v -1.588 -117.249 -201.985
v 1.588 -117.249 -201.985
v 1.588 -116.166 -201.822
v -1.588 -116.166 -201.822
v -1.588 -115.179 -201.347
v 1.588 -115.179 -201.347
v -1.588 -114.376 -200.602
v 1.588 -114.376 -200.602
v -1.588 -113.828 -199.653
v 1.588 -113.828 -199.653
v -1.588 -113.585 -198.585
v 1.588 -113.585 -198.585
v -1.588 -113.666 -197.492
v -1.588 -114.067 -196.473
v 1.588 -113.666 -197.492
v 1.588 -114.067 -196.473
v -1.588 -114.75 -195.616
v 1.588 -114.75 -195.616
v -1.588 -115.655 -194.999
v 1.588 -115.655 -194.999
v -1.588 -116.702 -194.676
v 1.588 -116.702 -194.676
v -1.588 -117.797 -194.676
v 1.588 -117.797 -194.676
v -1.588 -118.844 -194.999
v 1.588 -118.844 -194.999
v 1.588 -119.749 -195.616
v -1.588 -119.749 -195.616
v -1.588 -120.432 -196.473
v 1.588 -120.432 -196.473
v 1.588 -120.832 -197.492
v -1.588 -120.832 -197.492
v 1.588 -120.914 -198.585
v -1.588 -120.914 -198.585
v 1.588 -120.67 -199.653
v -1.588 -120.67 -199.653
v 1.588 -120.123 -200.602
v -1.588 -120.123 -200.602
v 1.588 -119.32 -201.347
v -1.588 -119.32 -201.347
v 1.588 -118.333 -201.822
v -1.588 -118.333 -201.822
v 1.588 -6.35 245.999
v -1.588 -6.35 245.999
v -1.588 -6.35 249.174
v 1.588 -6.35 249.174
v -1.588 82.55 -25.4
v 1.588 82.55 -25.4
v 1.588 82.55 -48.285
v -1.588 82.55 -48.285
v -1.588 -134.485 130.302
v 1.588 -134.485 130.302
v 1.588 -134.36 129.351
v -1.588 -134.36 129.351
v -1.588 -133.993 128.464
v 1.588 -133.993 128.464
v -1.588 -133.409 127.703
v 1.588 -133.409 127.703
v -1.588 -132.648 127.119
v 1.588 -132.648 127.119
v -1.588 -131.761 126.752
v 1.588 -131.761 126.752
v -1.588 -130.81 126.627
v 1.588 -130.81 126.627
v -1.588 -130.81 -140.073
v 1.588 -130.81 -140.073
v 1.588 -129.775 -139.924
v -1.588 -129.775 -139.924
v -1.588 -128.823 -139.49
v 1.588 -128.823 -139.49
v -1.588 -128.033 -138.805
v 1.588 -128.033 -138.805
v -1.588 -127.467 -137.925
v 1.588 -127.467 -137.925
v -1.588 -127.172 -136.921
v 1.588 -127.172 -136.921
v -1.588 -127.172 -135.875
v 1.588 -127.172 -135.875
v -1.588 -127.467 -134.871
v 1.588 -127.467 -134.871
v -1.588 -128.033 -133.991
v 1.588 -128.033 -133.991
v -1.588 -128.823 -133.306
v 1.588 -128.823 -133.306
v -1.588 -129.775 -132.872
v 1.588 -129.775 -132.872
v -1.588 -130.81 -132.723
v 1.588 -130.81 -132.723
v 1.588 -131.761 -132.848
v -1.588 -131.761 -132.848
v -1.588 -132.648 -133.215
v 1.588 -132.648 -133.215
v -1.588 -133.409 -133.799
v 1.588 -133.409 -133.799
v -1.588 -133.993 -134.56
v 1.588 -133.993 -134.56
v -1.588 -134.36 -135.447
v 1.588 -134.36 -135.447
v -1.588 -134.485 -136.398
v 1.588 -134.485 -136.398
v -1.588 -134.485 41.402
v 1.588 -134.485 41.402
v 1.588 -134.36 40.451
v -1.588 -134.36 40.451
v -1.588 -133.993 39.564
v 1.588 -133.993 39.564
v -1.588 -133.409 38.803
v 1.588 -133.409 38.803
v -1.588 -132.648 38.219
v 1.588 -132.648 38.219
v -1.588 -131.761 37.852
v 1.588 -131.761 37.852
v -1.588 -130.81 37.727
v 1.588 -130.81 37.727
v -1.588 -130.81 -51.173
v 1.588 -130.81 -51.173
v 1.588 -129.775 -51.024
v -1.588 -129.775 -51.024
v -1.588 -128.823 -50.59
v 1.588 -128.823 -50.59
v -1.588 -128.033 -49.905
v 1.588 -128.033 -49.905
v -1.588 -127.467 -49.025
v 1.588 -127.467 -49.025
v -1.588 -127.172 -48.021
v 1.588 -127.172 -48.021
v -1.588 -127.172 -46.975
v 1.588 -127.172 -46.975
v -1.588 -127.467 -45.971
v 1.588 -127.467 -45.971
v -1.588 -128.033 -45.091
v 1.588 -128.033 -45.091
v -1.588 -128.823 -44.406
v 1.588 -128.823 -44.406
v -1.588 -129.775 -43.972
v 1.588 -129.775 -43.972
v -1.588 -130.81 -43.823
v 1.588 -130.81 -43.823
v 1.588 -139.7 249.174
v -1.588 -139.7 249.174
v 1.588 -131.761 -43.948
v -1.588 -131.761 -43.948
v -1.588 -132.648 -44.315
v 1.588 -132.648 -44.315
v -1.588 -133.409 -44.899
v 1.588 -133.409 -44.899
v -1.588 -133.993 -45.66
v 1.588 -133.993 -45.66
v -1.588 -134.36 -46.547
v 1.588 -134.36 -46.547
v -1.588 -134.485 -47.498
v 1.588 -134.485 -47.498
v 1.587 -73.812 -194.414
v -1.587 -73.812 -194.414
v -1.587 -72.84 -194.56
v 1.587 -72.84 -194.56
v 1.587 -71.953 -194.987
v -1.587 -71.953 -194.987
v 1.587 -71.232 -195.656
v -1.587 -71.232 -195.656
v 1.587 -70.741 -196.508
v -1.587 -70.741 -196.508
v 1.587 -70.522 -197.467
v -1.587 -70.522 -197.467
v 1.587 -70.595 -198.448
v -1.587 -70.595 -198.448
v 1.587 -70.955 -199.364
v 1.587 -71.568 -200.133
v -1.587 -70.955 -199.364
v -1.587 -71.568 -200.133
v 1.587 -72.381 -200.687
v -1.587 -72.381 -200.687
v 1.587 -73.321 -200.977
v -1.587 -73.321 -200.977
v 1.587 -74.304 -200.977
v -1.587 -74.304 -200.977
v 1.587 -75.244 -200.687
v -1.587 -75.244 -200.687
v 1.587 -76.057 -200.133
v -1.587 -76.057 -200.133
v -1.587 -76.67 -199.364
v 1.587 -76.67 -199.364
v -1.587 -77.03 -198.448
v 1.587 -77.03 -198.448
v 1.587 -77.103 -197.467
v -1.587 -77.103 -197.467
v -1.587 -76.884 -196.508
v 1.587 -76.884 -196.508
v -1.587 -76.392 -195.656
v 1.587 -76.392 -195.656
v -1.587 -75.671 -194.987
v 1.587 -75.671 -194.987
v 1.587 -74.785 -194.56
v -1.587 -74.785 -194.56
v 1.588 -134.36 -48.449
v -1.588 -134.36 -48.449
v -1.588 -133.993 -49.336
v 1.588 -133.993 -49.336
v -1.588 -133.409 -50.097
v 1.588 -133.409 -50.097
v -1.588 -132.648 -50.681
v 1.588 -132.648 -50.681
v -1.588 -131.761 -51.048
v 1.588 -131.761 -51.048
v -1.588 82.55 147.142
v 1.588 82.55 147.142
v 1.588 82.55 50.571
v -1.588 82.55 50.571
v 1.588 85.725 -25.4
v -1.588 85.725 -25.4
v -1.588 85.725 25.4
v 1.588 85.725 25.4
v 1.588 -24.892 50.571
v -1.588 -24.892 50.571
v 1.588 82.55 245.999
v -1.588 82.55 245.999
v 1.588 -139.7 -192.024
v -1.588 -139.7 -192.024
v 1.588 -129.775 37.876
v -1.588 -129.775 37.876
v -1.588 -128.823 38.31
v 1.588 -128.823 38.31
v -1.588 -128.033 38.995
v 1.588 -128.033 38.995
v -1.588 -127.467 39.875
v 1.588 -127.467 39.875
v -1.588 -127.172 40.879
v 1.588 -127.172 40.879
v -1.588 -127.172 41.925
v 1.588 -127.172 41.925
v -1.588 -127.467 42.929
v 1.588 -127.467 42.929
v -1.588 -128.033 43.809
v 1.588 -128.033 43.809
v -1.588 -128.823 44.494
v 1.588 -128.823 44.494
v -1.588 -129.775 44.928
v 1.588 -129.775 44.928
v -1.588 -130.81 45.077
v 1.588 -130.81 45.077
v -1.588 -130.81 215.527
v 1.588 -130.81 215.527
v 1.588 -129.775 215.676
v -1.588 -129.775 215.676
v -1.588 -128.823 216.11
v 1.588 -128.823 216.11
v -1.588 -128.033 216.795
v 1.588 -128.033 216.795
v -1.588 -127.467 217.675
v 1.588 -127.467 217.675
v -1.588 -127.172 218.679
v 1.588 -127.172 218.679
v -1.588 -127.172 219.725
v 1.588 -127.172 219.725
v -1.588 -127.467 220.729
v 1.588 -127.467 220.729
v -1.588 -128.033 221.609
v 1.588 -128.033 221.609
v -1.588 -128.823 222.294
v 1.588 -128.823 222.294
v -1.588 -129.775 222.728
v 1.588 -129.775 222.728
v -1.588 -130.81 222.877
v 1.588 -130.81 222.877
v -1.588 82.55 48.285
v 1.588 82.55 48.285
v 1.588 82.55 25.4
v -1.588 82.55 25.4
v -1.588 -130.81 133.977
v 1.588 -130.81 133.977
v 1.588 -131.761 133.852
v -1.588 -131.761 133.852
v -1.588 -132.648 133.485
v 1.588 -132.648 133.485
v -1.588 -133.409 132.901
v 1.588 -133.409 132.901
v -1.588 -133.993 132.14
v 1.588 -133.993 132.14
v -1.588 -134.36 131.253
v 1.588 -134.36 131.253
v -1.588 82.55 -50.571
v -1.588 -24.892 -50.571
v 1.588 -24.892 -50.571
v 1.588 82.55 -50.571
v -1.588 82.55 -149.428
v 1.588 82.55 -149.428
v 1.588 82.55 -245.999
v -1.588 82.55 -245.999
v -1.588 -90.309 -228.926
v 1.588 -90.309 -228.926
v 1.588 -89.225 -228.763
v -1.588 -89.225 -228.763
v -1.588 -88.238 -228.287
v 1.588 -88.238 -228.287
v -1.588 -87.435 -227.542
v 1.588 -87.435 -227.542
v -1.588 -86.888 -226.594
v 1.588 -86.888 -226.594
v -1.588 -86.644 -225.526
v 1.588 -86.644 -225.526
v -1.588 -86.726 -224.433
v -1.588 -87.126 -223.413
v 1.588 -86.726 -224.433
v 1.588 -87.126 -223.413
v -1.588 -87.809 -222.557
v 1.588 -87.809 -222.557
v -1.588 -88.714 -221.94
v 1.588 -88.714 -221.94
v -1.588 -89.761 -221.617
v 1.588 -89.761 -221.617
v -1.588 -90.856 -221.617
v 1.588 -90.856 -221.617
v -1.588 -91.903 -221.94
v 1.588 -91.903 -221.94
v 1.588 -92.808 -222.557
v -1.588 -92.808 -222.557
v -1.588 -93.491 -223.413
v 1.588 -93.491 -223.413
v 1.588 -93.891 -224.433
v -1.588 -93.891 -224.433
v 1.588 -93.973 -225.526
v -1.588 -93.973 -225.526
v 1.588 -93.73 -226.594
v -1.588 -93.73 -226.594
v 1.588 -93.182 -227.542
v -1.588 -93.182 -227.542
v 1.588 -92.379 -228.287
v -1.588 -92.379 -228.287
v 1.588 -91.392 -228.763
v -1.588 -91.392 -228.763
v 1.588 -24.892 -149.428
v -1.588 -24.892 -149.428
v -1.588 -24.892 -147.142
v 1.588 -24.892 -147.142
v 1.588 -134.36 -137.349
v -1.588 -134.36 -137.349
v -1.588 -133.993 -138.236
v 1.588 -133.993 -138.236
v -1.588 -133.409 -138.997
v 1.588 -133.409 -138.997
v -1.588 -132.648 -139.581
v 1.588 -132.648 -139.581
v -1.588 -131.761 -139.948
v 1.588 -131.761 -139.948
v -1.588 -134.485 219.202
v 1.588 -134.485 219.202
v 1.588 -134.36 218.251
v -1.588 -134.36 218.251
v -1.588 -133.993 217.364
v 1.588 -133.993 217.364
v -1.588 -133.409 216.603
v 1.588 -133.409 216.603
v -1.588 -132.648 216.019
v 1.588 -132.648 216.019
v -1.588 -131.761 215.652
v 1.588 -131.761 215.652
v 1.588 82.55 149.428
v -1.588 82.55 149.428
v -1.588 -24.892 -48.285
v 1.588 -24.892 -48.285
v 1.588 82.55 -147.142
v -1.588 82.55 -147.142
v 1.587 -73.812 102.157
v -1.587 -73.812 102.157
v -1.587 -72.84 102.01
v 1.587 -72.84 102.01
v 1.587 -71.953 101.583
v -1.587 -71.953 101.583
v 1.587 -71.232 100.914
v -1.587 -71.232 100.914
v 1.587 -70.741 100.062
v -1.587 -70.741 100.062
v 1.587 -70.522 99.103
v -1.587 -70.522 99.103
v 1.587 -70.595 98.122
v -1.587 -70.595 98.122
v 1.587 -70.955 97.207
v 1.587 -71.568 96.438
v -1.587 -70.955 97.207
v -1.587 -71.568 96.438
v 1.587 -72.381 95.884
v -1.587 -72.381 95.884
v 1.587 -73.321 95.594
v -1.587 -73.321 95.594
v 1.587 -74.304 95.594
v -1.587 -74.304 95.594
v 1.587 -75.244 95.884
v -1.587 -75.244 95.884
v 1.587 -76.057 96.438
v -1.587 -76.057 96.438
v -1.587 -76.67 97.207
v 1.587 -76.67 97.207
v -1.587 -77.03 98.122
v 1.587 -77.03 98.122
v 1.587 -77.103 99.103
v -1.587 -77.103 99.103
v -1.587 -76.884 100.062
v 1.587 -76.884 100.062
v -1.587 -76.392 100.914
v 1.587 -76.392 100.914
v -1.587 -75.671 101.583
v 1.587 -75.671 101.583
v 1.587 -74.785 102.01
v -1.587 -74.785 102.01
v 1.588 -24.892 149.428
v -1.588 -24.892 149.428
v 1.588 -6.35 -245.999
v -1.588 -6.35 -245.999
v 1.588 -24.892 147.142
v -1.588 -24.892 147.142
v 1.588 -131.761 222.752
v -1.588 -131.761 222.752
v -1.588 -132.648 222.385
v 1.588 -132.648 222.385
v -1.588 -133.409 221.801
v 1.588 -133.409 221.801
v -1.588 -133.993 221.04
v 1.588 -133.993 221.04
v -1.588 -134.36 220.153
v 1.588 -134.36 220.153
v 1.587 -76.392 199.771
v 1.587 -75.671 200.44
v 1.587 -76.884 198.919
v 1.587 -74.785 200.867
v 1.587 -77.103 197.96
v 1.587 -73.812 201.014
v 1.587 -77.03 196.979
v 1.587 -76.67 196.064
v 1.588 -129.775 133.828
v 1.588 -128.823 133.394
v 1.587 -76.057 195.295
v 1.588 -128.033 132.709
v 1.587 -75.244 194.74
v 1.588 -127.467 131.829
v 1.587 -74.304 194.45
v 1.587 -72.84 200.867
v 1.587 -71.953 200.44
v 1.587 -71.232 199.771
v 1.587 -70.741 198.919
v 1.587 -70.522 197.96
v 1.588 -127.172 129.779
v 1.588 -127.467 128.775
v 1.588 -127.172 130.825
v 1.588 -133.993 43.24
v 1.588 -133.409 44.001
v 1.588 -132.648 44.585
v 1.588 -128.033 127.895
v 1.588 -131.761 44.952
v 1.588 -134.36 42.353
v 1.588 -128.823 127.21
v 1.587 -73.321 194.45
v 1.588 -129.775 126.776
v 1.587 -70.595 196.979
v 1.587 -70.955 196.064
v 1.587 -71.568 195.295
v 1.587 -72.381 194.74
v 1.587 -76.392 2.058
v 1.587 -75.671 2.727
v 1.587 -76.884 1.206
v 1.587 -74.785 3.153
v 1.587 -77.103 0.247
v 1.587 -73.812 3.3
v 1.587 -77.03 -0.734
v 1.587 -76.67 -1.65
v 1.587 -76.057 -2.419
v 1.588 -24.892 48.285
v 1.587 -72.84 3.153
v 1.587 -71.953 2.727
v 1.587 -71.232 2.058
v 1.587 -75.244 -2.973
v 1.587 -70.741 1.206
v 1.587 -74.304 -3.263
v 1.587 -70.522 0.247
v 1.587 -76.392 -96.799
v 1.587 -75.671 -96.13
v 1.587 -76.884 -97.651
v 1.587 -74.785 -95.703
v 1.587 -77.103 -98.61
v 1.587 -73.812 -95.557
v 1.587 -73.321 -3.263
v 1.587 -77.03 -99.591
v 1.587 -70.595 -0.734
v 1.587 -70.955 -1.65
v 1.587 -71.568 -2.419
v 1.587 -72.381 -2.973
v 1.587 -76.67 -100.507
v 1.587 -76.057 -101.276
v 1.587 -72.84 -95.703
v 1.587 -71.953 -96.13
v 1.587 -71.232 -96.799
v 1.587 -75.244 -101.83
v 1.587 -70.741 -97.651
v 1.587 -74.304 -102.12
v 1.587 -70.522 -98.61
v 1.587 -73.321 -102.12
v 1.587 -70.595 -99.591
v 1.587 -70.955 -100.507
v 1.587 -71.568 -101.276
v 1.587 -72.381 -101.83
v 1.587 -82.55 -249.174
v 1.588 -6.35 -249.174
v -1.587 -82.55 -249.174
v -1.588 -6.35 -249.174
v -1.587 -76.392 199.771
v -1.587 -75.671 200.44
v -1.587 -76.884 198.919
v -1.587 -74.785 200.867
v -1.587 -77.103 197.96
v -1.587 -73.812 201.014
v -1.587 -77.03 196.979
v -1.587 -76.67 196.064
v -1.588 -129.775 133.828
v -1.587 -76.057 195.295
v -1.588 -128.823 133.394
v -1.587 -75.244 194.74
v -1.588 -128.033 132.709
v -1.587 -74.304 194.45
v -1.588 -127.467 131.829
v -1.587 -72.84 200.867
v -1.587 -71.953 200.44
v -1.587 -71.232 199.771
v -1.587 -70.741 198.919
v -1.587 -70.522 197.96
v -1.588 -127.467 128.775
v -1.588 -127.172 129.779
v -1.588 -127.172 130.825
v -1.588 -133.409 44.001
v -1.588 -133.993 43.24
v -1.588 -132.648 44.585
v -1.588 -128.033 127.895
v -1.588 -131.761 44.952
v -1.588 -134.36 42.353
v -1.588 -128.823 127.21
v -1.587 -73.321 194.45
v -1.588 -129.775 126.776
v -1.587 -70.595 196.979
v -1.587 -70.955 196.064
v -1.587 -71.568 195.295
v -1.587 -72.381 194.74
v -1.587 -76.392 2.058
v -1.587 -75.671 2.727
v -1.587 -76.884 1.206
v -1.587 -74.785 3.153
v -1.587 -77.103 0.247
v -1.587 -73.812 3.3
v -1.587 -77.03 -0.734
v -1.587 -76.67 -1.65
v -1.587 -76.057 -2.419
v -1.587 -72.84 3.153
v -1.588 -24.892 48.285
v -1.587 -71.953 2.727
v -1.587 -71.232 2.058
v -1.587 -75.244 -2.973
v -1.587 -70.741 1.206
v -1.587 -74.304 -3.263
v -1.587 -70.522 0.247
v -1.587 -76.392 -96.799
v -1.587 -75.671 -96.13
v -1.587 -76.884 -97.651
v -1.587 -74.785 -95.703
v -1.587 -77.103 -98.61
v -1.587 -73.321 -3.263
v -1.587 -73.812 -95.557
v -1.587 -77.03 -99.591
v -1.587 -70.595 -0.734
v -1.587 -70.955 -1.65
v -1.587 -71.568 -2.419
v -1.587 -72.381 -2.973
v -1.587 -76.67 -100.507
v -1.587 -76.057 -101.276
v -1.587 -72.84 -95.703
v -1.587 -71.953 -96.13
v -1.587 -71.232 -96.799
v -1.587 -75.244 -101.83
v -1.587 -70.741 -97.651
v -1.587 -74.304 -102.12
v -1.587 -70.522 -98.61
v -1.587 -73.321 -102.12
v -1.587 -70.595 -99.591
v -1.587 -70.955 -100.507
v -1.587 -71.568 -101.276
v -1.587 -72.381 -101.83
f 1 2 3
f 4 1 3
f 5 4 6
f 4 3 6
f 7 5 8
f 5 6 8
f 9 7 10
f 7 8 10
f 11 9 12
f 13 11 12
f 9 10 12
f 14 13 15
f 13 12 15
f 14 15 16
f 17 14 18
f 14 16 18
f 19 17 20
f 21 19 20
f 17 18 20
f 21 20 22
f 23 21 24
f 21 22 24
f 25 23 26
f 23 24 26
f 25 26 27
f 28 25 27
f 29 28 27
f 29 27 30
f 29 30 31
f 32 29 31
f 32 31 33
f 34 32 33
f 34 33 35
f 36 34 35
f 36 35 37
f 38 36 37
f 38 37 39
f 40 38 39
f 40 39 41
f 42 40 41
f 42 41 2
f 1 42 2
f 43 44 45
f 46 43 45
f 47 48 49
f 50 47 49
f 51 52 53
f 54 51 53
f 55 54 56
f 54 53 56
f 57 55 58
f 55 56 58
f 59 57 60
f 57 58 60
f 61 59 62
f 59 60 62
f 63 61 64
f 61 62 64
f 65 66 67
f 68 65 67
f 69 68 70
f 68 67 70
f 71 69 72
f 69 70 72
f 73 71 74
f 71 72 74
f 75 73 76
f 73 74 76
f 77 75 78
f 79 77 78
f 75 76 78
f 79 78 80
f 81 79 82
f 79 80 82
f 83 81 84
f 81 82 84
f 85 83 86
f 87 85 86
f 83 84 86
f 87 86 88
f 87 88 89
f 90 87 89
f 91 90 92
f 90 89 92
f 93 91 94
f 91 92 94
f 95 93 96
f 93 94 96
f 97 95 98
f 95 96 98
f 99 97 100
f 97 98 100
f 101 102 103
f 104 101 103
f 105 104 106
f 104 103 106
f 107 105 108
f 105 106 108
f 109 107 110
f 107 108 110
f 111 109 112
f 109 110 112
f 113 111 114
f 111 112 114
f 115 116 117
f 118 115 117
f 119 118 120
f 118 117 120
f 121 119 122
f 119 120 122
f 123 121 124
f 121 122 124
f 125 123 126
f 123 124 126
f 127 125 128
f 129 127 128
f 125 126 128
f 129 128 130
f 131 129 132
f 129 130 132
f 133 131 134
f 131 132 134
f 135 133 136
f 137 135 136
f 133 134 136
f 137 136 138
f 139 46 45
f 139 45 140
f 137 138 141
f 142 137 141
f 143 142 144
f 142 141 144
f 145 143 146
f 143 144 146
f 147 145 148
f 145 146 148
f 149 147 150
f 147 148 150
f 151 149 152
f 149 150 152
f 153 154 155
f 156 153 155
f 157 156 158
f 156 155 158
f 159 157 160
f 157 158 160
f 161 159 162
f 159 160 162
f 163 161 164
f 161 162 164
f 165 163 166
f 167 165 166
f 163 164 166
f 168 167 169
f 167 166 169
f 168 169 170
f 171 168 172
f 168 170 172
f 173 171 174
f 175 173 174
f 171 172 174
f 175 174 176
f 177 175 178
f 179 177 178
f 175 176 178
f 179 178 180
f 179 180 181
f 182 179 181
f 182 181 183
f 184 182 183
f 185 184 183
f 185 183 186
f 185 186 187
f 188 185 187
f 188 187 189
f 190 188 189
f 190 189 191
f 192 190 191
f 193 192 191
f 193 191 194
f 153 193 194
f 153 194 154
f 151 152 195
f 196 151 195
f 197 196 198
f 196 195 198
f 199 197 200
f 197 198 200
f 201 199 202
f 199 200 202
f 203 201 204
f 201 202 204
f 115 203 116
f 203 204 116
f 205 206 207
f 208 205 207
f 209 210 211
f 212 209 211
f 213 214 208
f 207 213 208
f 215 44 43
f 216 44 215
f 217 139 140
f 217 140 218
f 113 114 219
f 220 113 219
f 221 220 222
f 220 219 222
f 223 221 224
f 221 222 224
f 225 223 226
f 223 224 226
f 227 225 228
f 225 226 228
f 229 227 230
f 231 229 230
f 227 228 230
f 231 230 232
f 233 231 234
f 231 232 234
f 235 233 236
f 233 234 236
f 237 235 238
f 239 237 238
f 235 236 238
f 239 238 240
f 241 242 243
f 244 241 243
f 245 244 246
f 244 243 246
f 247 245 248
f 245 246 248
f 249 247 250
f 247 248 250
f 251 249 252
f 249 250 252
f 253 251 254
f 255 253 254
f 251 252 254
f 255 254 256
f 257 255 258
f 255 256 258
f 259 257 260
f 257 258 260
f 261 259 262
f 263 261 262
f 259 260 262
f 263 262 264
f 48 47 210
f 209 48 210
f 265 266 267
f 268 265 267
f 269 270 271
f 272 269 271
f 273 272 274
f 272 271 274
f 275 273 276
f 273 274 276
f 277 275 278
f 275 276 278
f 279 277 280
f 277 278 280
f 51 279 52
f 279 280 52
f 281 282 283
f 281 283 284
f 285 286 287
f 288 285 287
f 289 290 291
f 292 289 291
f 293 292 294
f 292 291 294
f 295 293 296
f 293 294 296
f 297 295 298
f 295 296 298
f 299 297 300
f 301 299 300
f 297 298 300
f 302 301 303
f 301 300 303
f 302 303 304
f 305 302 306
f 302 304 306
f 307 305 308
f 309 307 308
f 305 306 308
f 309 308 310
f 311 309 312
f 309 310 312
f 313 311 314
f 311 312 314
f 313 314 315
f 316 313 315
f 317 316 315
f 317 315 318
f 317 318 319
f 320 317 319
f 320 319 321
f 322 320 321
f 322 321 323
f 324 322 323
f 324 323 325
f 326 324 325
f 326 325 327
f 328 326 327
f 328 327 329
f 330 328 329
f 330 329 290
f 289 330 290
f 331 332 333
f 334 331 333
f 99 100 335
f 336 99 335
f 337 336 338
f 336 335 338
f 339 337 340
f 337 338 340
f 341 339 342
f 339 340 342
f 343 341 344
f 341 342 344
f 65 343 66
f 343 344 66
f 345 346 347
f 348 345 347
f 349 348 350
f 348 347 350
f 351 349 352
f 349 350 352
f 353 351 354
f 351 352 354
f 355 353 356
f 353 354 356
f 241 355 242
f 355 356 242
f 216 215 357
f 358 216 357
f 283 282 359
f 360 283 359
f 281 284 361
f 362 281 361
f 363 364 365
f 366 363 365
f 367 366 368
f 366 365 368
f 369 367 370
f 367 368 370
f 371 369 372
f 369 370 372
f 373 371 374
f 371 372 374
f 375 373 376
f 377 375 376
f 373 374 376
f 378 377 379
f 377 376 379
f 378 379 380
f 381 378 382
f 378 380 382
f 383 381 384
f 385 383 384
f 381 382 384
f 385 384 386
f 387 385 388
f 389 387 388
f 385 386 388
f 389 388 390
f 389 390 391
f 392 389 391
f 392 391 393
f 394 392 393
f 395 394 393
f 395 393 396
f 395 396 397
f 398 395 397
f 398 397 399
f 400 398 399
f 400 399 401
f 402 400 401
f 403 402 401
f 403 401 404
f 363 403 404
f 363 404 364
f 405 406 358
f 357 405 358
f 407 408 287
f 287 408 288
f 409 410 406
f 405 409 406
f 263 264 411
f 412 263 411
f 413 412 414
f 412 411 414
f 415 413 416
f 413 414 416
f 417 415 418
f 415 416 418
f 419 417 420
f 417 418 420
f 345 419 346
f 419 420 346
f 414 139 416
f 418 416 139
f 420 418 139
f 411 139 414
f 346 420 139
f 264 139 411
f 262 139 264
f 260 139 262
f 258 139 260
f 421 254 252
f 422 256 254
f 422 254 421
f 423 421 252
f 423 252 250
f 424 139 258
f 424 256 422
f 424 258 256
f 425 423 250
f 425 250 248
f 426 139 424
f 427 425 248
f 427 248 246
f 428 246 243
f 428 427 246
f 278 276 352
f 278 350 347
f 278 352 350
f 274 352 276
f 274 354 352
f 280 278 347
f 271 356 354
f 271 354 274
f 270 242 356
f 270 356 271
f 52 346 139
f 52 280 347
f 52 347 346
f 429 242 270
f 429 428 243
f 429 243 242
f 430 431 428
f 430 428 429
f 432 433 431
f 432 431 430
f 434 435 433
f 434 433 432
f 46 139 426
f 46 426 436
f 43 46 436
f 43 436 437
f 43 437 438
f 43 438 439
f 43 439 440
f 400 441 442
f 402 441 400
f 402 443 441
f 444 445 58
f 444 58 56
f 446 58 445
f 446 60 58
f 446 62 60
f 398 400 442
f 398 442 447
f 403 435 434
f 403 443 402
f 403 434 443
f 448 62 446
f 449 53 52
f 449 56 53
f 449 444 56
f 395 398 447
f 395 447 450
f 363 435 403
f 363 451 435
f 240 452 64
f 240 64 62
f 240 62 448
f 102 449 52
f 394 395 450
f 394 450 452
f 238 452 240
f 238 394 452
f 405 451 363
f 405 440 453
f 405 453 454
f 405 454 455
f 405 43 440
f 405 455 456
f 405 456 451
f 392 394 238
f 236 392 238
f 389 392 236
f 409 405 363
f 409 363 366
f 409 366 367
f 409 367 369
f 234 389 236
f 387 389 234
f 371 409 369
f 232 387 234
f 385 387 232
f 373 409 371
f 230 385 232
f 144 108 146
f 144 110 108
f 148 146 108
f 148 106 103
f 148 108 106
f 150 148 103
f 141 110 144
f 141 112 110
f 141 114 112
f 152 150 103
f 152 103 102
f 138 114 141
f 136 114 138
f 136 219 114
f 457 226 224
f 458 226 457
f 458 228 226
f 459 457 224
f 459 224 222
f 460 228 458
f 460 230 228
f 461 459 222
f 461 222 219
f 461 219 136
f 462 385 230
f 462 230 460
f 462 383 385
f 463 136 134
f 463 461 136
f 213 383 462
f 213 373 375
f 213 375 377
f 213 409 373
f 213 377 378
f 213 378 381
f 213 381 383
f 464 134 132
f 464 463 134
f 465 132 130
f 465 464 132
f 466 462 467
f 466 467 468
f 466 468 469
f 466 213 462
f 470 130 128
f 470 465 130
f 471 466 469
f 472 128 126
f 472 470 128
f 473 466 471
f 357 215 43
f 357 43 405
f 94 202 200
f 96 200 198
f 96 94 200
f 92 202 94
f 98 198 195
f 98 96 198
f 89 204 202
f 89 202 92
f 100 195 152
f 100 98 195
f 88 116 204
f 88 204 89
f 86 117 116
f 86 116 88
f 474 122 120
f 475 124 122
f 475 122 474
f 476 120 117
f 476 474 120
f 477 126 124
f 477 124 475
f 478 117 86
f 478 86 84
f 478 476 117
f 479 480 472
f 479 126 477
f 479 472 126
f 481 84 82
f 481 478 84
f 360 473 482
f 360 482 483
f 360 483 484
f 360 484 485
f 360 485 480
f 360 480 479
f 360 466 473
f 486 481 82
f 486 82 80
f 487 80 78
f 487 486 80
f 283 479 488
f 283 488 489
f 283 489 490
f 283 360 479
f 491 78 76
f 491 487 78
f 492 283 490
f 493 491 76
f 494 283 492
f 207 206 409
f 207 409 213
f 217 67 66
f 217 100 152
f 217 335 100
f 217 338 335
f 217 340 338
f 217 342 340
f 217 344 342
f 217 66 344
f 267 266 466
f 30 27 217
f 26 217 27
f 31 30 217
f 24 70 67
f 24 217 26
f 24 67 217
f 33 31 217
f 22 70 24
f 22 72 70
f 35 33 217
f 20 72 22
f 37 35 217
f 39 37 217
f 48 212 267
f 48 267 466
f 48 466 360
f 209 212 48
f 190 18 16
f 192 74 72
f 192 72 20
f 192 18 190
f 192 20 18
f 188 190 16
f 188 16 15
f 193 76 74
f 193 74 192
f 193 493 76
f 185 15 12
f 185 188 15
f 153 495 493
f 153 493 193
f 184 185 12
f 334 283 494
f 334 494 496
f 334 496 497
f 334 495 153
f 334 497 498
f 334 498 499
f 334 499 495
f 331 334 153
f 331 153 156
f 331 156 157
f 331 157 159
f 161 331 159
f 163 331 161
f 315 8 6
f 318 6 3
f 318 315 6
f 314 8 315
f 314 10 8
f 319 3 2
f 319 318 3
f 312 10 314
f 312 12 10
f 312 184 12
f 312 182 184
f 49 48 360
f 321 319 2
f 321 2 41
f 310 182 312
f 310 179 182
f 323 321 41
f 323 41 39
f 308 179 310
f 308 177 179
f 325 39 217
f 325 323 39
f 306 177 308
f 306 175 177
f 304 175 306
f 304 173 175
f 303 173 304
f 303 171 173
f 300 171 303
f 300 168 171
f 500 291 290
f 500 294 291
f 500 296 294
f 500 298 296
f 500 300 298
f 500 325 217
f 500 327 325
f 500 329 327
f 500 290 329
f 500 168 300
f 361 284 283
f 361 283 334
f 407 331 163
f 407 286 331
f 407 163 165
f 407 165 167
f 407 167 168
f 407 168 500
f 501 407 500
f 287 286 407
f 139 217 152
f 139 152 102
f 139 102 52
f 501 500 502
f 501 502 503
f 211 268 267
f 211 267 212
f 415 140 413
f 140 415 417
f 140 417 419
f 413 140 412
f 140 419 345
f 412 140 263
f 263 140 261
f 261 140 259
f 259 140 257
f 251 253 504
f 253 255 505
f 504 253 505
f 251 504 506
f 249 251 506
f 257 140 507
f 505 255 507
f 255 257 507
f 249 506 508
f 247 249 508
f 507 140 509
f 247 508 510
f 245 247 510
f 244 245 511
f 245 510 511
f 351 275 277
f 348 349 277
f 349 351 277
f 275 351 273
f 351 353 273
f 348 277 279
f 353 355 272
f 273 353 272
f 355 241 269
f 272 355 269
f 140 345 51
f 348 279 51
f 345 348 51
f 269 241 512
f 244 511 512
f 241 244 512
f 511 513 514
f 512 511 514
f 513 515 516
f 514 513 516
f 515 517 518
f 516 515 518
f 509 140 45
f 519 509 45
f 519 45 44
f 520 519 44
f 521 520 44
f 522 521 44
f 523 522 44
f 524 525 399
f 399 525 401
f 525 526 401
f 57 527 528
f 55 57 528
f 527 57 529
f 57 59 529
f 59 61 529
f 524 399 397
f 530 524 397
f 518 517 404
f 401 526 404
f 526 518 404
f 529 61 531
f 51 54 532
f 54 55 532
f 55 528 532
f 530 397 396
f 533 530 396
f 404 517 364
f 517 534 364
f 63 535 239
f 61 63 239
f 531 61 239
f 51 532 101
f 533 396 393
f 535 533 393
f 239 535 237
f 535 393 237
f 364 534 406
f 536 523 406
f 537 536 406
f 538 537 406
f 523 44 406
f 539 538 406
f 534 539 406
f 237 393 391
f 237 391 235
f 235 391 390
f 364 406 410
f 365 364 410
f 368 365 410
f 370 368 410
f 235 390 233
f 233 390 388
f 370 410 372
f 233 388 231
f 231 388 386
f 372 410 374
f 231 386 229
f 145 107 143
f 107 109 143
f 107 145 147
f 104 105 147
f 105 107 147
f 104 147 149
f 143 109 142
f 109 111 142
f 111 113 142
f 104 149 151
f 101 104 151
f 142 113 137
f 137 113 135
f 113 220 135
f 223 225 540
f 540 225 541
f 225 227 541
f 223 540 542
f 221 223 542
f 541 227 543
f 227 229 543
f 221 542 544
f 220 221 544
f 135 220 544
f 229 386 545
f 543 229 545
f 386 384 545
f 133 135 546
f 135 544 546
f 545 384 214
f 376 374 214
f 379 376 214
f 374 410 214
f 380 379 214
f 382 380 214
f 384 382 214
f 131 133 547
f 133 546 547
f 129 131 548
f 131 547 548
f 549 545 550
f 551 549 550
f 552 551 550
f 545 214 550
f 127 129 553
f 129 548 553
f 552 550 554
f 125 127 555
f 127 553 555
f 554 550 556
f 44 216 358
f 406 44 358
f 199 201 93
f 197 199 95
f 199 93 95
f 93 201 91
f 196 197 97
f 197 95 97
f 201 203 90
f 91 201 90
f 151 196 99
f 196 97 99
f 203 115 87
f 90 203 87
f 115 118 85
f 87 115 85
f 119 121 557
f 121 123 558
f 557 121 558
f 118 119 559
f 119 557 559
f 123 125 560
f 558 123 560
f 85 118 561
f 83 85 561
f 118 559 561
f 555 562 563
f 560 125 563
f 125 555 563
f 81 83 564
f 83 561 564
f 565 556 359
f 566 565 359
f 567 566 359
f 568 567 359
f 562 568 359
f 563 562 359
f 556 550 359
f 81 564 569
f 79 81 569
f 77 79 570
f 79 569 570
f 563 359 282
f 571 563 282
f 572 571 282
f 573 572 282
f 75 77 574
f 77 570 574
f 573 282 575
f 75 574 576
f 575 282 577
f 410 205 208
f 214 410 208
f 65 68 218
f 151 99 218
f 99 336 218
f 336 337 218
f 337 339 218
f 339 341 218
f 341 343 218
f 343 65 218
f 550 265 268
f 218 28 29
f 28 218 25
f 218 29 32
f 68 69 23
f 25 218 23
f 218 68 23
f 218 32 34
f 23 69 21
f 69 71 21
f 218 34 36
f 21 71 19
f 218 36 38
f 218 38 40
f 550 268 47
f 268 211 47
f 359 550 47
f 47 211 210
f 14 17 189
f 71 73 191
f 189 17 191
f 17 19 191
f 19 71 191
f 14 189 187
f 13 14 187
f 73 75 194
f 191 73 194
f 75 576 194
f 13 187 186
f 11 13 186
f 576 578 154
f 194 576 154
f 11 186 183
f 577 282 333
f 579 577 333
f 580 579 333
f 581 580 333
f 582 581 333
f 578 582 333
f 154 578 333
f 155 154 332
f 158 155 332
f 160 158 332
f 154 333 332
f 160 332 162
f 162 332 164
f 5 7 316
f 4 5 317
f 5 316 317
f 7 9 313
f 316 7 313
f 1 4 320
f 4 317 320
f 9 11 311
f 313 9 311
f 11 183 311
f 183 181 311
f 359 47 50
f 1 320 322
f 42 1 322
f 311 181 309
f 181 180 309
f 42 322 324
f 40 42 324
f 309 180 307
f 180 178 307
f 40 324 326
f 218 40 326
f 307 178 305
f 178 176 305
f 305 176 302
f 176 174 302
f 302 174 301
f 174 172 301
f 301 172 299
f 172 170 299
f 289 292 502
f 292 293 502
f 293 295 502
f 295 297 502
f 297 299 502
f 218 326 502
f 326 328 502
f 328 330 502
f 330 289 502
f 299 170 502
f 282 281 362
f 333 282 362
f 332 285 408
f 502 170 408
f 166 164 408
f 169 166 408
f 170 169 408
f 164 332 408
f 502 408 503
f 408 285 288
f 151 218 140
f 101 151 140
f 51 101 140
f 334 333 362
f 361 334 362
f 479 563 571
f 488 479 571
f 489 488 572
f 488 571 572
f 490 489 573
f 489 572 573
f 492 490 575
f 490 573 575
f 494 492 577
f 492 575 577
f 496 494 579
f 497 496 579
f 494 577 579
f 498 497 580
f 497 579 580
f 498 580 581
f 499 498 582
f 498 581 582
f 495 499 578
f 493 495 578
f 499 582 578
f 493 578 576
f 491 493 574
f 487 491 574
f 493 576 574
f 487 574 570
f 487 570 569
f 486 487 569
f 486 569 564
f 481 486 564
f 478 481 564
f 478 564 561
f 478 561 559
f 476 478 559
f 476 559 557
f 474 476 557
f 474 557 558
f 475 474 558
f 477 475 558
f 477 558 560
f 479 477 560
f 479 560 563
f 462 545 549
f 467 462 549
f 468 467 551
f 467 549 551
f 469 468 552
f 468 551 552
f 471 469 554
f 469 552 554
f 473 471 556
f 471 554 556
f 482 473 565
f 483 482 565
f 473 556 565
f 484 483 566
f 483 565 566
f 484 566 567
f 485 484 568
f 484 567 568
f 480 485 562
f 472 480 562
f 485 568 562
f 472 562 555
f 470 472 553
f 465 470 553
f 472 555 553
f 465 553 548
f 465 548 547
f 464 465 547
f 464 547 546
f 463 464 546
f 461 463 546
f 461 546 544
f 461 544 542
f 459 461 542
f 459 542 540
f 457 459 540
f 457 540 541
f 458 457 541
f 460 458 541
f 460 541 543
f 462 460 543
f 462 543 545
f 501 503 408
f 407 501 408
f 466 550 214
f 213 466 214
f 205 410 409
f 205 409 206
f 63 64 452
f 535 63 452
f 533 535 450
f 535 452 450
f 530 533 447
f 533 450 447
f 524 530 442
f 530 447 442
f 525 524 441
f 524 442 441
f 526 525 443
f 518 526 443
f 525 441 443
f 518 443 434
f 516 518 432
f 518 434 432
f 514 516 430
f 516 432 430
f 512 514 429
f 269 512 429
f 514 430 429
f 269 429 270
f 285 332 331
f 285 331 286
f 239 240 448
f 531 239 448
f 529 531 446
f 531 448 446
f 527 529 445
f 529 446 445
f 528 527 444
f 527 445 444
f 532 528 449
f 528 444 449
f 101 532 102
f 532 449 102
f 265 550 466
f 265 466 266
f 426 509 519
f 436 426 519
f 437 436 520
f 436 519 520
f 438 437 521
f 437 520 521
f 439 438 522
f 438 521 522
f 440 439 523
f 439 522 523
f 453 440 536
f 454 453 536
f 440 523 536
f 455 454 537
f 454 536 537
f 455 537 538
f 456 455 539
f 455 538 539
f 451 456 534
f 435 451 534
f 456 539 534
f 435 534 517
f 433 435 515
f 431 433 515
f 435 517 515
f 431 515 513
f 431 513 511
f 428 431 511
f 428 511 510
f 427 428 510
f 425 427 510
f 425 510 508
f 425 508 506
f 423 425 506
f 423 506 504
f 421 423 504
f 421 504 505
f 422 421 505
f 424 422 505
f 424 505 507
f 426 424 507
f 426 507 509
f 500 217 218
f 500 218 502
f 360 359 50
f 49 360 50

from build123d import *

# Parameters (mm, degrees)
SKETCH1_W            = 498.348
SKETCH1_H            = 165.1
BOSS_EXTRUDE1_DEPTH  = 1.5875
BOSS_EXTRUDE2_DEPTH  = 3.175
CUT_EXTRUDE1_DEPTH   = 3.175
LPATTERN1_COUNT      = 5
LPATTERN1_PITCH      = 88.9
SKETCH4_R            = 3.675
CUT_EXTRUDE2_DEPTH   = 4.175
LPATTERN2_COUNT      = 2
LPATTERN2_PITCH      = 38.1
SKETCH5_W            = 3.175
SKETCH5_H            = 88.9
CUT_EXTRUDE3_DEPTH   = 4.175
SKETCH6_W            = 2.286
SKETCH6_H            = 107.442
CUT_EXTRUDE4_DEPTH   = 4.175
LPATTERN3_COUNT      = 4
LPATTERN3_PITCH      = 98.8568
SKETCH7_W            = 50.8
SKETCH7_H            = 3.175
BOSS_EXTRUDE3_DEPTH  = 3.175
M6_CLEARANCE_HOLE1_D = 6.6
LPATTERN4_COUNT      = 3
LPATTERN4_PITCH      = 98.8568
LPATTERN4_COL_COUNT  = 3
LPATTERN4_COL_PITCH  = 98.8568


with BuildPart() as part:
    # Sketch1 → Boss-Extrude1 (new body, symmetric)
    with BuildSketch(Plane(origin=(0, 0, 0), x_dir=(0, 0, -1), z_dir=(1, 0, 0))):
        Rectangle(SKETCH1_W, SKETCH1_H)
    extrude(amount=BOSS_EXTRUDE1_DEPTH, both=True)

    # Sketch2 → Boss-Extrude2 (add)
    with BuildSketch(Plane(origin=(1.5875, 0, 0), x_dir=(0, 0, -1), z_dir=(1, 0, 0))):
        Polygon((-249.174, -139.7), (192.024, -139.7), (249.174, -82.55), (-249.174, -82.55), align=None)
    extrude(amount=-BOSS_EXTRUDE2_DEPTH)

    # Sketch3 → Cut-Extrude1 (cut)
    with BuildSketch(Plane(origin=(1.5875, 0, 0), x_dir=(0, 0, -1), z_dir=(1, 0, 0))):
        with BuildLine():
            ThreePointArc((-222.877, -130.81), (-221.800617421, -133.408617421), (-219.202, -134.485))
            Line((-219.202, -134.485), (-219.202, -130.81))
            Line((-219.202, -130.81), (-222.877, -130.81))
        make_face()
        with BuildLine():
            Line((-219.202, -130.81), (-219.202, -134.485))
            ThreePointArc((-219.202, -134.485), (-216.603382579, -133.408617421), (-215.527, -130.81))
            ThreePointArc((-215.527, -130.81), (-219.202, -127.135), (-222.877, -130.81))
            Line((-222.877, -130.81), (-219.202, -130.81))
        make_face()
    cut_extrude1 = extrude(amount=-CUT_EXTRUDE1_DEPTH, mode=Mode.SUBTRACT)

    # LPattern1: Cut-Extrude1 ×5
    with Locations(*[(0, 0, -i * LPATTERN1_PITCH) for i in range(1, LPATTERN1_COUNT)]):
        add(cut_extrude1, mode=Mode.SUBTRACT)

    # Sketch4 → Cut-Extrude2 (cut, through all)
    with BuildSketch(Plane(origin=(1.5875, 0, 0), x_dir=(0, 0, -1), z_dir=(1, 0, 0))):
        with Locations((198.310179285, -117.249359697)):
            Circle(SKETCH4_R)
    cut_extrude2 = extrude(amount=-CUT_EXTRUDE2_DEPTH, mode=Mode.SUBTRACT)

    # LPattern2: Cut-Extrude2 ×2
    with Locations(*[Vector(0, 0.707106781, -0.707106781) * (i * LPATTERN2_PITCH) for i in range(1, LPATTERN2_COUNT)]):
        add(cut_extrude2, mode=Mode.SUBTRACT)

    # Sketch5 → Cut-Extrude3 (cut, through all)
    with BuildSketch(Plane.ZY.offset(1.5875)):
        with Locations((-247.5865, 38.1)):
            Rectangle(SKETCH5_W, SKETCH5_H)
        with Locations((247.5865, 38.1)):
            Rectangle(SKETCH5_W, SKETCH5_H)
    extrude(amount=-CUT_EXTRUDE3_DEPTH, mode=Mode.SUBTRACT)

    # Sketch6 → Cut-Extrude4 (cut, through all)
    with BuildSketch(Plane.ZY.offset(1.5875)):
        with Locations((-148.2852, 28.829)):
            Rectangle(SKETCH6_W, SKETCH6_H)
    cut_extrude4 = extrude(amount=-CUT_EXTRUDE4_DEPTH, mode=Mode.SUBTRACT)

    # LPattern3: Cut-Extrude4 ×4
    with Locations(*[(0, 0, i * LPATTERN3_PITCH) for i in range(1, LPATTERN3_COUNT)]):
        add(cut_extrude4, mode=Mode.SUBTRACT)

    # Sketch7 → Boss-Extrude3 (add)
    with BuildSketch(Plane.ZY.offset(1.5875)):
        with Locations((0, 84.1375)):
            Rectangle(SKETCH7_W, SKETCH7_H)
    extrude(amount=-BOSS_EXTRUDE3_DEPTH)

    # M6 Clearance Hole1 (through all)
    with Locations(Plane(origin=(1.5875, 0, 0), x_dir=(0, 0, -1), z_dir=(1, 0, 0))):
        with Locations((0, -73.8124)):
            m6_clearance_hole1 = Hole(M6_CLEARANCE_HOLE1_D / 2)

    # LPattern4: M6 Clearance Hole1 ×3
    with Locations(*[(0, 0, i * LPATTERN4_PITCH) for i in range(1, LPATTERN4_COUNT)]):
        add(m6_clearance_hole1, mode=Mode.SUBTRACT)

    # LPattern4 col: M6 Clearance Hole1 ×3
    with Locations(*[(0, 0, -i * LPATTERN4_COL_PITCH) for i in range(1, LPATTERN4_COL_COUNT)]):
        add(m6_clearance_hole1, mode=Mode.SUBTRACT)


solid = part.part
